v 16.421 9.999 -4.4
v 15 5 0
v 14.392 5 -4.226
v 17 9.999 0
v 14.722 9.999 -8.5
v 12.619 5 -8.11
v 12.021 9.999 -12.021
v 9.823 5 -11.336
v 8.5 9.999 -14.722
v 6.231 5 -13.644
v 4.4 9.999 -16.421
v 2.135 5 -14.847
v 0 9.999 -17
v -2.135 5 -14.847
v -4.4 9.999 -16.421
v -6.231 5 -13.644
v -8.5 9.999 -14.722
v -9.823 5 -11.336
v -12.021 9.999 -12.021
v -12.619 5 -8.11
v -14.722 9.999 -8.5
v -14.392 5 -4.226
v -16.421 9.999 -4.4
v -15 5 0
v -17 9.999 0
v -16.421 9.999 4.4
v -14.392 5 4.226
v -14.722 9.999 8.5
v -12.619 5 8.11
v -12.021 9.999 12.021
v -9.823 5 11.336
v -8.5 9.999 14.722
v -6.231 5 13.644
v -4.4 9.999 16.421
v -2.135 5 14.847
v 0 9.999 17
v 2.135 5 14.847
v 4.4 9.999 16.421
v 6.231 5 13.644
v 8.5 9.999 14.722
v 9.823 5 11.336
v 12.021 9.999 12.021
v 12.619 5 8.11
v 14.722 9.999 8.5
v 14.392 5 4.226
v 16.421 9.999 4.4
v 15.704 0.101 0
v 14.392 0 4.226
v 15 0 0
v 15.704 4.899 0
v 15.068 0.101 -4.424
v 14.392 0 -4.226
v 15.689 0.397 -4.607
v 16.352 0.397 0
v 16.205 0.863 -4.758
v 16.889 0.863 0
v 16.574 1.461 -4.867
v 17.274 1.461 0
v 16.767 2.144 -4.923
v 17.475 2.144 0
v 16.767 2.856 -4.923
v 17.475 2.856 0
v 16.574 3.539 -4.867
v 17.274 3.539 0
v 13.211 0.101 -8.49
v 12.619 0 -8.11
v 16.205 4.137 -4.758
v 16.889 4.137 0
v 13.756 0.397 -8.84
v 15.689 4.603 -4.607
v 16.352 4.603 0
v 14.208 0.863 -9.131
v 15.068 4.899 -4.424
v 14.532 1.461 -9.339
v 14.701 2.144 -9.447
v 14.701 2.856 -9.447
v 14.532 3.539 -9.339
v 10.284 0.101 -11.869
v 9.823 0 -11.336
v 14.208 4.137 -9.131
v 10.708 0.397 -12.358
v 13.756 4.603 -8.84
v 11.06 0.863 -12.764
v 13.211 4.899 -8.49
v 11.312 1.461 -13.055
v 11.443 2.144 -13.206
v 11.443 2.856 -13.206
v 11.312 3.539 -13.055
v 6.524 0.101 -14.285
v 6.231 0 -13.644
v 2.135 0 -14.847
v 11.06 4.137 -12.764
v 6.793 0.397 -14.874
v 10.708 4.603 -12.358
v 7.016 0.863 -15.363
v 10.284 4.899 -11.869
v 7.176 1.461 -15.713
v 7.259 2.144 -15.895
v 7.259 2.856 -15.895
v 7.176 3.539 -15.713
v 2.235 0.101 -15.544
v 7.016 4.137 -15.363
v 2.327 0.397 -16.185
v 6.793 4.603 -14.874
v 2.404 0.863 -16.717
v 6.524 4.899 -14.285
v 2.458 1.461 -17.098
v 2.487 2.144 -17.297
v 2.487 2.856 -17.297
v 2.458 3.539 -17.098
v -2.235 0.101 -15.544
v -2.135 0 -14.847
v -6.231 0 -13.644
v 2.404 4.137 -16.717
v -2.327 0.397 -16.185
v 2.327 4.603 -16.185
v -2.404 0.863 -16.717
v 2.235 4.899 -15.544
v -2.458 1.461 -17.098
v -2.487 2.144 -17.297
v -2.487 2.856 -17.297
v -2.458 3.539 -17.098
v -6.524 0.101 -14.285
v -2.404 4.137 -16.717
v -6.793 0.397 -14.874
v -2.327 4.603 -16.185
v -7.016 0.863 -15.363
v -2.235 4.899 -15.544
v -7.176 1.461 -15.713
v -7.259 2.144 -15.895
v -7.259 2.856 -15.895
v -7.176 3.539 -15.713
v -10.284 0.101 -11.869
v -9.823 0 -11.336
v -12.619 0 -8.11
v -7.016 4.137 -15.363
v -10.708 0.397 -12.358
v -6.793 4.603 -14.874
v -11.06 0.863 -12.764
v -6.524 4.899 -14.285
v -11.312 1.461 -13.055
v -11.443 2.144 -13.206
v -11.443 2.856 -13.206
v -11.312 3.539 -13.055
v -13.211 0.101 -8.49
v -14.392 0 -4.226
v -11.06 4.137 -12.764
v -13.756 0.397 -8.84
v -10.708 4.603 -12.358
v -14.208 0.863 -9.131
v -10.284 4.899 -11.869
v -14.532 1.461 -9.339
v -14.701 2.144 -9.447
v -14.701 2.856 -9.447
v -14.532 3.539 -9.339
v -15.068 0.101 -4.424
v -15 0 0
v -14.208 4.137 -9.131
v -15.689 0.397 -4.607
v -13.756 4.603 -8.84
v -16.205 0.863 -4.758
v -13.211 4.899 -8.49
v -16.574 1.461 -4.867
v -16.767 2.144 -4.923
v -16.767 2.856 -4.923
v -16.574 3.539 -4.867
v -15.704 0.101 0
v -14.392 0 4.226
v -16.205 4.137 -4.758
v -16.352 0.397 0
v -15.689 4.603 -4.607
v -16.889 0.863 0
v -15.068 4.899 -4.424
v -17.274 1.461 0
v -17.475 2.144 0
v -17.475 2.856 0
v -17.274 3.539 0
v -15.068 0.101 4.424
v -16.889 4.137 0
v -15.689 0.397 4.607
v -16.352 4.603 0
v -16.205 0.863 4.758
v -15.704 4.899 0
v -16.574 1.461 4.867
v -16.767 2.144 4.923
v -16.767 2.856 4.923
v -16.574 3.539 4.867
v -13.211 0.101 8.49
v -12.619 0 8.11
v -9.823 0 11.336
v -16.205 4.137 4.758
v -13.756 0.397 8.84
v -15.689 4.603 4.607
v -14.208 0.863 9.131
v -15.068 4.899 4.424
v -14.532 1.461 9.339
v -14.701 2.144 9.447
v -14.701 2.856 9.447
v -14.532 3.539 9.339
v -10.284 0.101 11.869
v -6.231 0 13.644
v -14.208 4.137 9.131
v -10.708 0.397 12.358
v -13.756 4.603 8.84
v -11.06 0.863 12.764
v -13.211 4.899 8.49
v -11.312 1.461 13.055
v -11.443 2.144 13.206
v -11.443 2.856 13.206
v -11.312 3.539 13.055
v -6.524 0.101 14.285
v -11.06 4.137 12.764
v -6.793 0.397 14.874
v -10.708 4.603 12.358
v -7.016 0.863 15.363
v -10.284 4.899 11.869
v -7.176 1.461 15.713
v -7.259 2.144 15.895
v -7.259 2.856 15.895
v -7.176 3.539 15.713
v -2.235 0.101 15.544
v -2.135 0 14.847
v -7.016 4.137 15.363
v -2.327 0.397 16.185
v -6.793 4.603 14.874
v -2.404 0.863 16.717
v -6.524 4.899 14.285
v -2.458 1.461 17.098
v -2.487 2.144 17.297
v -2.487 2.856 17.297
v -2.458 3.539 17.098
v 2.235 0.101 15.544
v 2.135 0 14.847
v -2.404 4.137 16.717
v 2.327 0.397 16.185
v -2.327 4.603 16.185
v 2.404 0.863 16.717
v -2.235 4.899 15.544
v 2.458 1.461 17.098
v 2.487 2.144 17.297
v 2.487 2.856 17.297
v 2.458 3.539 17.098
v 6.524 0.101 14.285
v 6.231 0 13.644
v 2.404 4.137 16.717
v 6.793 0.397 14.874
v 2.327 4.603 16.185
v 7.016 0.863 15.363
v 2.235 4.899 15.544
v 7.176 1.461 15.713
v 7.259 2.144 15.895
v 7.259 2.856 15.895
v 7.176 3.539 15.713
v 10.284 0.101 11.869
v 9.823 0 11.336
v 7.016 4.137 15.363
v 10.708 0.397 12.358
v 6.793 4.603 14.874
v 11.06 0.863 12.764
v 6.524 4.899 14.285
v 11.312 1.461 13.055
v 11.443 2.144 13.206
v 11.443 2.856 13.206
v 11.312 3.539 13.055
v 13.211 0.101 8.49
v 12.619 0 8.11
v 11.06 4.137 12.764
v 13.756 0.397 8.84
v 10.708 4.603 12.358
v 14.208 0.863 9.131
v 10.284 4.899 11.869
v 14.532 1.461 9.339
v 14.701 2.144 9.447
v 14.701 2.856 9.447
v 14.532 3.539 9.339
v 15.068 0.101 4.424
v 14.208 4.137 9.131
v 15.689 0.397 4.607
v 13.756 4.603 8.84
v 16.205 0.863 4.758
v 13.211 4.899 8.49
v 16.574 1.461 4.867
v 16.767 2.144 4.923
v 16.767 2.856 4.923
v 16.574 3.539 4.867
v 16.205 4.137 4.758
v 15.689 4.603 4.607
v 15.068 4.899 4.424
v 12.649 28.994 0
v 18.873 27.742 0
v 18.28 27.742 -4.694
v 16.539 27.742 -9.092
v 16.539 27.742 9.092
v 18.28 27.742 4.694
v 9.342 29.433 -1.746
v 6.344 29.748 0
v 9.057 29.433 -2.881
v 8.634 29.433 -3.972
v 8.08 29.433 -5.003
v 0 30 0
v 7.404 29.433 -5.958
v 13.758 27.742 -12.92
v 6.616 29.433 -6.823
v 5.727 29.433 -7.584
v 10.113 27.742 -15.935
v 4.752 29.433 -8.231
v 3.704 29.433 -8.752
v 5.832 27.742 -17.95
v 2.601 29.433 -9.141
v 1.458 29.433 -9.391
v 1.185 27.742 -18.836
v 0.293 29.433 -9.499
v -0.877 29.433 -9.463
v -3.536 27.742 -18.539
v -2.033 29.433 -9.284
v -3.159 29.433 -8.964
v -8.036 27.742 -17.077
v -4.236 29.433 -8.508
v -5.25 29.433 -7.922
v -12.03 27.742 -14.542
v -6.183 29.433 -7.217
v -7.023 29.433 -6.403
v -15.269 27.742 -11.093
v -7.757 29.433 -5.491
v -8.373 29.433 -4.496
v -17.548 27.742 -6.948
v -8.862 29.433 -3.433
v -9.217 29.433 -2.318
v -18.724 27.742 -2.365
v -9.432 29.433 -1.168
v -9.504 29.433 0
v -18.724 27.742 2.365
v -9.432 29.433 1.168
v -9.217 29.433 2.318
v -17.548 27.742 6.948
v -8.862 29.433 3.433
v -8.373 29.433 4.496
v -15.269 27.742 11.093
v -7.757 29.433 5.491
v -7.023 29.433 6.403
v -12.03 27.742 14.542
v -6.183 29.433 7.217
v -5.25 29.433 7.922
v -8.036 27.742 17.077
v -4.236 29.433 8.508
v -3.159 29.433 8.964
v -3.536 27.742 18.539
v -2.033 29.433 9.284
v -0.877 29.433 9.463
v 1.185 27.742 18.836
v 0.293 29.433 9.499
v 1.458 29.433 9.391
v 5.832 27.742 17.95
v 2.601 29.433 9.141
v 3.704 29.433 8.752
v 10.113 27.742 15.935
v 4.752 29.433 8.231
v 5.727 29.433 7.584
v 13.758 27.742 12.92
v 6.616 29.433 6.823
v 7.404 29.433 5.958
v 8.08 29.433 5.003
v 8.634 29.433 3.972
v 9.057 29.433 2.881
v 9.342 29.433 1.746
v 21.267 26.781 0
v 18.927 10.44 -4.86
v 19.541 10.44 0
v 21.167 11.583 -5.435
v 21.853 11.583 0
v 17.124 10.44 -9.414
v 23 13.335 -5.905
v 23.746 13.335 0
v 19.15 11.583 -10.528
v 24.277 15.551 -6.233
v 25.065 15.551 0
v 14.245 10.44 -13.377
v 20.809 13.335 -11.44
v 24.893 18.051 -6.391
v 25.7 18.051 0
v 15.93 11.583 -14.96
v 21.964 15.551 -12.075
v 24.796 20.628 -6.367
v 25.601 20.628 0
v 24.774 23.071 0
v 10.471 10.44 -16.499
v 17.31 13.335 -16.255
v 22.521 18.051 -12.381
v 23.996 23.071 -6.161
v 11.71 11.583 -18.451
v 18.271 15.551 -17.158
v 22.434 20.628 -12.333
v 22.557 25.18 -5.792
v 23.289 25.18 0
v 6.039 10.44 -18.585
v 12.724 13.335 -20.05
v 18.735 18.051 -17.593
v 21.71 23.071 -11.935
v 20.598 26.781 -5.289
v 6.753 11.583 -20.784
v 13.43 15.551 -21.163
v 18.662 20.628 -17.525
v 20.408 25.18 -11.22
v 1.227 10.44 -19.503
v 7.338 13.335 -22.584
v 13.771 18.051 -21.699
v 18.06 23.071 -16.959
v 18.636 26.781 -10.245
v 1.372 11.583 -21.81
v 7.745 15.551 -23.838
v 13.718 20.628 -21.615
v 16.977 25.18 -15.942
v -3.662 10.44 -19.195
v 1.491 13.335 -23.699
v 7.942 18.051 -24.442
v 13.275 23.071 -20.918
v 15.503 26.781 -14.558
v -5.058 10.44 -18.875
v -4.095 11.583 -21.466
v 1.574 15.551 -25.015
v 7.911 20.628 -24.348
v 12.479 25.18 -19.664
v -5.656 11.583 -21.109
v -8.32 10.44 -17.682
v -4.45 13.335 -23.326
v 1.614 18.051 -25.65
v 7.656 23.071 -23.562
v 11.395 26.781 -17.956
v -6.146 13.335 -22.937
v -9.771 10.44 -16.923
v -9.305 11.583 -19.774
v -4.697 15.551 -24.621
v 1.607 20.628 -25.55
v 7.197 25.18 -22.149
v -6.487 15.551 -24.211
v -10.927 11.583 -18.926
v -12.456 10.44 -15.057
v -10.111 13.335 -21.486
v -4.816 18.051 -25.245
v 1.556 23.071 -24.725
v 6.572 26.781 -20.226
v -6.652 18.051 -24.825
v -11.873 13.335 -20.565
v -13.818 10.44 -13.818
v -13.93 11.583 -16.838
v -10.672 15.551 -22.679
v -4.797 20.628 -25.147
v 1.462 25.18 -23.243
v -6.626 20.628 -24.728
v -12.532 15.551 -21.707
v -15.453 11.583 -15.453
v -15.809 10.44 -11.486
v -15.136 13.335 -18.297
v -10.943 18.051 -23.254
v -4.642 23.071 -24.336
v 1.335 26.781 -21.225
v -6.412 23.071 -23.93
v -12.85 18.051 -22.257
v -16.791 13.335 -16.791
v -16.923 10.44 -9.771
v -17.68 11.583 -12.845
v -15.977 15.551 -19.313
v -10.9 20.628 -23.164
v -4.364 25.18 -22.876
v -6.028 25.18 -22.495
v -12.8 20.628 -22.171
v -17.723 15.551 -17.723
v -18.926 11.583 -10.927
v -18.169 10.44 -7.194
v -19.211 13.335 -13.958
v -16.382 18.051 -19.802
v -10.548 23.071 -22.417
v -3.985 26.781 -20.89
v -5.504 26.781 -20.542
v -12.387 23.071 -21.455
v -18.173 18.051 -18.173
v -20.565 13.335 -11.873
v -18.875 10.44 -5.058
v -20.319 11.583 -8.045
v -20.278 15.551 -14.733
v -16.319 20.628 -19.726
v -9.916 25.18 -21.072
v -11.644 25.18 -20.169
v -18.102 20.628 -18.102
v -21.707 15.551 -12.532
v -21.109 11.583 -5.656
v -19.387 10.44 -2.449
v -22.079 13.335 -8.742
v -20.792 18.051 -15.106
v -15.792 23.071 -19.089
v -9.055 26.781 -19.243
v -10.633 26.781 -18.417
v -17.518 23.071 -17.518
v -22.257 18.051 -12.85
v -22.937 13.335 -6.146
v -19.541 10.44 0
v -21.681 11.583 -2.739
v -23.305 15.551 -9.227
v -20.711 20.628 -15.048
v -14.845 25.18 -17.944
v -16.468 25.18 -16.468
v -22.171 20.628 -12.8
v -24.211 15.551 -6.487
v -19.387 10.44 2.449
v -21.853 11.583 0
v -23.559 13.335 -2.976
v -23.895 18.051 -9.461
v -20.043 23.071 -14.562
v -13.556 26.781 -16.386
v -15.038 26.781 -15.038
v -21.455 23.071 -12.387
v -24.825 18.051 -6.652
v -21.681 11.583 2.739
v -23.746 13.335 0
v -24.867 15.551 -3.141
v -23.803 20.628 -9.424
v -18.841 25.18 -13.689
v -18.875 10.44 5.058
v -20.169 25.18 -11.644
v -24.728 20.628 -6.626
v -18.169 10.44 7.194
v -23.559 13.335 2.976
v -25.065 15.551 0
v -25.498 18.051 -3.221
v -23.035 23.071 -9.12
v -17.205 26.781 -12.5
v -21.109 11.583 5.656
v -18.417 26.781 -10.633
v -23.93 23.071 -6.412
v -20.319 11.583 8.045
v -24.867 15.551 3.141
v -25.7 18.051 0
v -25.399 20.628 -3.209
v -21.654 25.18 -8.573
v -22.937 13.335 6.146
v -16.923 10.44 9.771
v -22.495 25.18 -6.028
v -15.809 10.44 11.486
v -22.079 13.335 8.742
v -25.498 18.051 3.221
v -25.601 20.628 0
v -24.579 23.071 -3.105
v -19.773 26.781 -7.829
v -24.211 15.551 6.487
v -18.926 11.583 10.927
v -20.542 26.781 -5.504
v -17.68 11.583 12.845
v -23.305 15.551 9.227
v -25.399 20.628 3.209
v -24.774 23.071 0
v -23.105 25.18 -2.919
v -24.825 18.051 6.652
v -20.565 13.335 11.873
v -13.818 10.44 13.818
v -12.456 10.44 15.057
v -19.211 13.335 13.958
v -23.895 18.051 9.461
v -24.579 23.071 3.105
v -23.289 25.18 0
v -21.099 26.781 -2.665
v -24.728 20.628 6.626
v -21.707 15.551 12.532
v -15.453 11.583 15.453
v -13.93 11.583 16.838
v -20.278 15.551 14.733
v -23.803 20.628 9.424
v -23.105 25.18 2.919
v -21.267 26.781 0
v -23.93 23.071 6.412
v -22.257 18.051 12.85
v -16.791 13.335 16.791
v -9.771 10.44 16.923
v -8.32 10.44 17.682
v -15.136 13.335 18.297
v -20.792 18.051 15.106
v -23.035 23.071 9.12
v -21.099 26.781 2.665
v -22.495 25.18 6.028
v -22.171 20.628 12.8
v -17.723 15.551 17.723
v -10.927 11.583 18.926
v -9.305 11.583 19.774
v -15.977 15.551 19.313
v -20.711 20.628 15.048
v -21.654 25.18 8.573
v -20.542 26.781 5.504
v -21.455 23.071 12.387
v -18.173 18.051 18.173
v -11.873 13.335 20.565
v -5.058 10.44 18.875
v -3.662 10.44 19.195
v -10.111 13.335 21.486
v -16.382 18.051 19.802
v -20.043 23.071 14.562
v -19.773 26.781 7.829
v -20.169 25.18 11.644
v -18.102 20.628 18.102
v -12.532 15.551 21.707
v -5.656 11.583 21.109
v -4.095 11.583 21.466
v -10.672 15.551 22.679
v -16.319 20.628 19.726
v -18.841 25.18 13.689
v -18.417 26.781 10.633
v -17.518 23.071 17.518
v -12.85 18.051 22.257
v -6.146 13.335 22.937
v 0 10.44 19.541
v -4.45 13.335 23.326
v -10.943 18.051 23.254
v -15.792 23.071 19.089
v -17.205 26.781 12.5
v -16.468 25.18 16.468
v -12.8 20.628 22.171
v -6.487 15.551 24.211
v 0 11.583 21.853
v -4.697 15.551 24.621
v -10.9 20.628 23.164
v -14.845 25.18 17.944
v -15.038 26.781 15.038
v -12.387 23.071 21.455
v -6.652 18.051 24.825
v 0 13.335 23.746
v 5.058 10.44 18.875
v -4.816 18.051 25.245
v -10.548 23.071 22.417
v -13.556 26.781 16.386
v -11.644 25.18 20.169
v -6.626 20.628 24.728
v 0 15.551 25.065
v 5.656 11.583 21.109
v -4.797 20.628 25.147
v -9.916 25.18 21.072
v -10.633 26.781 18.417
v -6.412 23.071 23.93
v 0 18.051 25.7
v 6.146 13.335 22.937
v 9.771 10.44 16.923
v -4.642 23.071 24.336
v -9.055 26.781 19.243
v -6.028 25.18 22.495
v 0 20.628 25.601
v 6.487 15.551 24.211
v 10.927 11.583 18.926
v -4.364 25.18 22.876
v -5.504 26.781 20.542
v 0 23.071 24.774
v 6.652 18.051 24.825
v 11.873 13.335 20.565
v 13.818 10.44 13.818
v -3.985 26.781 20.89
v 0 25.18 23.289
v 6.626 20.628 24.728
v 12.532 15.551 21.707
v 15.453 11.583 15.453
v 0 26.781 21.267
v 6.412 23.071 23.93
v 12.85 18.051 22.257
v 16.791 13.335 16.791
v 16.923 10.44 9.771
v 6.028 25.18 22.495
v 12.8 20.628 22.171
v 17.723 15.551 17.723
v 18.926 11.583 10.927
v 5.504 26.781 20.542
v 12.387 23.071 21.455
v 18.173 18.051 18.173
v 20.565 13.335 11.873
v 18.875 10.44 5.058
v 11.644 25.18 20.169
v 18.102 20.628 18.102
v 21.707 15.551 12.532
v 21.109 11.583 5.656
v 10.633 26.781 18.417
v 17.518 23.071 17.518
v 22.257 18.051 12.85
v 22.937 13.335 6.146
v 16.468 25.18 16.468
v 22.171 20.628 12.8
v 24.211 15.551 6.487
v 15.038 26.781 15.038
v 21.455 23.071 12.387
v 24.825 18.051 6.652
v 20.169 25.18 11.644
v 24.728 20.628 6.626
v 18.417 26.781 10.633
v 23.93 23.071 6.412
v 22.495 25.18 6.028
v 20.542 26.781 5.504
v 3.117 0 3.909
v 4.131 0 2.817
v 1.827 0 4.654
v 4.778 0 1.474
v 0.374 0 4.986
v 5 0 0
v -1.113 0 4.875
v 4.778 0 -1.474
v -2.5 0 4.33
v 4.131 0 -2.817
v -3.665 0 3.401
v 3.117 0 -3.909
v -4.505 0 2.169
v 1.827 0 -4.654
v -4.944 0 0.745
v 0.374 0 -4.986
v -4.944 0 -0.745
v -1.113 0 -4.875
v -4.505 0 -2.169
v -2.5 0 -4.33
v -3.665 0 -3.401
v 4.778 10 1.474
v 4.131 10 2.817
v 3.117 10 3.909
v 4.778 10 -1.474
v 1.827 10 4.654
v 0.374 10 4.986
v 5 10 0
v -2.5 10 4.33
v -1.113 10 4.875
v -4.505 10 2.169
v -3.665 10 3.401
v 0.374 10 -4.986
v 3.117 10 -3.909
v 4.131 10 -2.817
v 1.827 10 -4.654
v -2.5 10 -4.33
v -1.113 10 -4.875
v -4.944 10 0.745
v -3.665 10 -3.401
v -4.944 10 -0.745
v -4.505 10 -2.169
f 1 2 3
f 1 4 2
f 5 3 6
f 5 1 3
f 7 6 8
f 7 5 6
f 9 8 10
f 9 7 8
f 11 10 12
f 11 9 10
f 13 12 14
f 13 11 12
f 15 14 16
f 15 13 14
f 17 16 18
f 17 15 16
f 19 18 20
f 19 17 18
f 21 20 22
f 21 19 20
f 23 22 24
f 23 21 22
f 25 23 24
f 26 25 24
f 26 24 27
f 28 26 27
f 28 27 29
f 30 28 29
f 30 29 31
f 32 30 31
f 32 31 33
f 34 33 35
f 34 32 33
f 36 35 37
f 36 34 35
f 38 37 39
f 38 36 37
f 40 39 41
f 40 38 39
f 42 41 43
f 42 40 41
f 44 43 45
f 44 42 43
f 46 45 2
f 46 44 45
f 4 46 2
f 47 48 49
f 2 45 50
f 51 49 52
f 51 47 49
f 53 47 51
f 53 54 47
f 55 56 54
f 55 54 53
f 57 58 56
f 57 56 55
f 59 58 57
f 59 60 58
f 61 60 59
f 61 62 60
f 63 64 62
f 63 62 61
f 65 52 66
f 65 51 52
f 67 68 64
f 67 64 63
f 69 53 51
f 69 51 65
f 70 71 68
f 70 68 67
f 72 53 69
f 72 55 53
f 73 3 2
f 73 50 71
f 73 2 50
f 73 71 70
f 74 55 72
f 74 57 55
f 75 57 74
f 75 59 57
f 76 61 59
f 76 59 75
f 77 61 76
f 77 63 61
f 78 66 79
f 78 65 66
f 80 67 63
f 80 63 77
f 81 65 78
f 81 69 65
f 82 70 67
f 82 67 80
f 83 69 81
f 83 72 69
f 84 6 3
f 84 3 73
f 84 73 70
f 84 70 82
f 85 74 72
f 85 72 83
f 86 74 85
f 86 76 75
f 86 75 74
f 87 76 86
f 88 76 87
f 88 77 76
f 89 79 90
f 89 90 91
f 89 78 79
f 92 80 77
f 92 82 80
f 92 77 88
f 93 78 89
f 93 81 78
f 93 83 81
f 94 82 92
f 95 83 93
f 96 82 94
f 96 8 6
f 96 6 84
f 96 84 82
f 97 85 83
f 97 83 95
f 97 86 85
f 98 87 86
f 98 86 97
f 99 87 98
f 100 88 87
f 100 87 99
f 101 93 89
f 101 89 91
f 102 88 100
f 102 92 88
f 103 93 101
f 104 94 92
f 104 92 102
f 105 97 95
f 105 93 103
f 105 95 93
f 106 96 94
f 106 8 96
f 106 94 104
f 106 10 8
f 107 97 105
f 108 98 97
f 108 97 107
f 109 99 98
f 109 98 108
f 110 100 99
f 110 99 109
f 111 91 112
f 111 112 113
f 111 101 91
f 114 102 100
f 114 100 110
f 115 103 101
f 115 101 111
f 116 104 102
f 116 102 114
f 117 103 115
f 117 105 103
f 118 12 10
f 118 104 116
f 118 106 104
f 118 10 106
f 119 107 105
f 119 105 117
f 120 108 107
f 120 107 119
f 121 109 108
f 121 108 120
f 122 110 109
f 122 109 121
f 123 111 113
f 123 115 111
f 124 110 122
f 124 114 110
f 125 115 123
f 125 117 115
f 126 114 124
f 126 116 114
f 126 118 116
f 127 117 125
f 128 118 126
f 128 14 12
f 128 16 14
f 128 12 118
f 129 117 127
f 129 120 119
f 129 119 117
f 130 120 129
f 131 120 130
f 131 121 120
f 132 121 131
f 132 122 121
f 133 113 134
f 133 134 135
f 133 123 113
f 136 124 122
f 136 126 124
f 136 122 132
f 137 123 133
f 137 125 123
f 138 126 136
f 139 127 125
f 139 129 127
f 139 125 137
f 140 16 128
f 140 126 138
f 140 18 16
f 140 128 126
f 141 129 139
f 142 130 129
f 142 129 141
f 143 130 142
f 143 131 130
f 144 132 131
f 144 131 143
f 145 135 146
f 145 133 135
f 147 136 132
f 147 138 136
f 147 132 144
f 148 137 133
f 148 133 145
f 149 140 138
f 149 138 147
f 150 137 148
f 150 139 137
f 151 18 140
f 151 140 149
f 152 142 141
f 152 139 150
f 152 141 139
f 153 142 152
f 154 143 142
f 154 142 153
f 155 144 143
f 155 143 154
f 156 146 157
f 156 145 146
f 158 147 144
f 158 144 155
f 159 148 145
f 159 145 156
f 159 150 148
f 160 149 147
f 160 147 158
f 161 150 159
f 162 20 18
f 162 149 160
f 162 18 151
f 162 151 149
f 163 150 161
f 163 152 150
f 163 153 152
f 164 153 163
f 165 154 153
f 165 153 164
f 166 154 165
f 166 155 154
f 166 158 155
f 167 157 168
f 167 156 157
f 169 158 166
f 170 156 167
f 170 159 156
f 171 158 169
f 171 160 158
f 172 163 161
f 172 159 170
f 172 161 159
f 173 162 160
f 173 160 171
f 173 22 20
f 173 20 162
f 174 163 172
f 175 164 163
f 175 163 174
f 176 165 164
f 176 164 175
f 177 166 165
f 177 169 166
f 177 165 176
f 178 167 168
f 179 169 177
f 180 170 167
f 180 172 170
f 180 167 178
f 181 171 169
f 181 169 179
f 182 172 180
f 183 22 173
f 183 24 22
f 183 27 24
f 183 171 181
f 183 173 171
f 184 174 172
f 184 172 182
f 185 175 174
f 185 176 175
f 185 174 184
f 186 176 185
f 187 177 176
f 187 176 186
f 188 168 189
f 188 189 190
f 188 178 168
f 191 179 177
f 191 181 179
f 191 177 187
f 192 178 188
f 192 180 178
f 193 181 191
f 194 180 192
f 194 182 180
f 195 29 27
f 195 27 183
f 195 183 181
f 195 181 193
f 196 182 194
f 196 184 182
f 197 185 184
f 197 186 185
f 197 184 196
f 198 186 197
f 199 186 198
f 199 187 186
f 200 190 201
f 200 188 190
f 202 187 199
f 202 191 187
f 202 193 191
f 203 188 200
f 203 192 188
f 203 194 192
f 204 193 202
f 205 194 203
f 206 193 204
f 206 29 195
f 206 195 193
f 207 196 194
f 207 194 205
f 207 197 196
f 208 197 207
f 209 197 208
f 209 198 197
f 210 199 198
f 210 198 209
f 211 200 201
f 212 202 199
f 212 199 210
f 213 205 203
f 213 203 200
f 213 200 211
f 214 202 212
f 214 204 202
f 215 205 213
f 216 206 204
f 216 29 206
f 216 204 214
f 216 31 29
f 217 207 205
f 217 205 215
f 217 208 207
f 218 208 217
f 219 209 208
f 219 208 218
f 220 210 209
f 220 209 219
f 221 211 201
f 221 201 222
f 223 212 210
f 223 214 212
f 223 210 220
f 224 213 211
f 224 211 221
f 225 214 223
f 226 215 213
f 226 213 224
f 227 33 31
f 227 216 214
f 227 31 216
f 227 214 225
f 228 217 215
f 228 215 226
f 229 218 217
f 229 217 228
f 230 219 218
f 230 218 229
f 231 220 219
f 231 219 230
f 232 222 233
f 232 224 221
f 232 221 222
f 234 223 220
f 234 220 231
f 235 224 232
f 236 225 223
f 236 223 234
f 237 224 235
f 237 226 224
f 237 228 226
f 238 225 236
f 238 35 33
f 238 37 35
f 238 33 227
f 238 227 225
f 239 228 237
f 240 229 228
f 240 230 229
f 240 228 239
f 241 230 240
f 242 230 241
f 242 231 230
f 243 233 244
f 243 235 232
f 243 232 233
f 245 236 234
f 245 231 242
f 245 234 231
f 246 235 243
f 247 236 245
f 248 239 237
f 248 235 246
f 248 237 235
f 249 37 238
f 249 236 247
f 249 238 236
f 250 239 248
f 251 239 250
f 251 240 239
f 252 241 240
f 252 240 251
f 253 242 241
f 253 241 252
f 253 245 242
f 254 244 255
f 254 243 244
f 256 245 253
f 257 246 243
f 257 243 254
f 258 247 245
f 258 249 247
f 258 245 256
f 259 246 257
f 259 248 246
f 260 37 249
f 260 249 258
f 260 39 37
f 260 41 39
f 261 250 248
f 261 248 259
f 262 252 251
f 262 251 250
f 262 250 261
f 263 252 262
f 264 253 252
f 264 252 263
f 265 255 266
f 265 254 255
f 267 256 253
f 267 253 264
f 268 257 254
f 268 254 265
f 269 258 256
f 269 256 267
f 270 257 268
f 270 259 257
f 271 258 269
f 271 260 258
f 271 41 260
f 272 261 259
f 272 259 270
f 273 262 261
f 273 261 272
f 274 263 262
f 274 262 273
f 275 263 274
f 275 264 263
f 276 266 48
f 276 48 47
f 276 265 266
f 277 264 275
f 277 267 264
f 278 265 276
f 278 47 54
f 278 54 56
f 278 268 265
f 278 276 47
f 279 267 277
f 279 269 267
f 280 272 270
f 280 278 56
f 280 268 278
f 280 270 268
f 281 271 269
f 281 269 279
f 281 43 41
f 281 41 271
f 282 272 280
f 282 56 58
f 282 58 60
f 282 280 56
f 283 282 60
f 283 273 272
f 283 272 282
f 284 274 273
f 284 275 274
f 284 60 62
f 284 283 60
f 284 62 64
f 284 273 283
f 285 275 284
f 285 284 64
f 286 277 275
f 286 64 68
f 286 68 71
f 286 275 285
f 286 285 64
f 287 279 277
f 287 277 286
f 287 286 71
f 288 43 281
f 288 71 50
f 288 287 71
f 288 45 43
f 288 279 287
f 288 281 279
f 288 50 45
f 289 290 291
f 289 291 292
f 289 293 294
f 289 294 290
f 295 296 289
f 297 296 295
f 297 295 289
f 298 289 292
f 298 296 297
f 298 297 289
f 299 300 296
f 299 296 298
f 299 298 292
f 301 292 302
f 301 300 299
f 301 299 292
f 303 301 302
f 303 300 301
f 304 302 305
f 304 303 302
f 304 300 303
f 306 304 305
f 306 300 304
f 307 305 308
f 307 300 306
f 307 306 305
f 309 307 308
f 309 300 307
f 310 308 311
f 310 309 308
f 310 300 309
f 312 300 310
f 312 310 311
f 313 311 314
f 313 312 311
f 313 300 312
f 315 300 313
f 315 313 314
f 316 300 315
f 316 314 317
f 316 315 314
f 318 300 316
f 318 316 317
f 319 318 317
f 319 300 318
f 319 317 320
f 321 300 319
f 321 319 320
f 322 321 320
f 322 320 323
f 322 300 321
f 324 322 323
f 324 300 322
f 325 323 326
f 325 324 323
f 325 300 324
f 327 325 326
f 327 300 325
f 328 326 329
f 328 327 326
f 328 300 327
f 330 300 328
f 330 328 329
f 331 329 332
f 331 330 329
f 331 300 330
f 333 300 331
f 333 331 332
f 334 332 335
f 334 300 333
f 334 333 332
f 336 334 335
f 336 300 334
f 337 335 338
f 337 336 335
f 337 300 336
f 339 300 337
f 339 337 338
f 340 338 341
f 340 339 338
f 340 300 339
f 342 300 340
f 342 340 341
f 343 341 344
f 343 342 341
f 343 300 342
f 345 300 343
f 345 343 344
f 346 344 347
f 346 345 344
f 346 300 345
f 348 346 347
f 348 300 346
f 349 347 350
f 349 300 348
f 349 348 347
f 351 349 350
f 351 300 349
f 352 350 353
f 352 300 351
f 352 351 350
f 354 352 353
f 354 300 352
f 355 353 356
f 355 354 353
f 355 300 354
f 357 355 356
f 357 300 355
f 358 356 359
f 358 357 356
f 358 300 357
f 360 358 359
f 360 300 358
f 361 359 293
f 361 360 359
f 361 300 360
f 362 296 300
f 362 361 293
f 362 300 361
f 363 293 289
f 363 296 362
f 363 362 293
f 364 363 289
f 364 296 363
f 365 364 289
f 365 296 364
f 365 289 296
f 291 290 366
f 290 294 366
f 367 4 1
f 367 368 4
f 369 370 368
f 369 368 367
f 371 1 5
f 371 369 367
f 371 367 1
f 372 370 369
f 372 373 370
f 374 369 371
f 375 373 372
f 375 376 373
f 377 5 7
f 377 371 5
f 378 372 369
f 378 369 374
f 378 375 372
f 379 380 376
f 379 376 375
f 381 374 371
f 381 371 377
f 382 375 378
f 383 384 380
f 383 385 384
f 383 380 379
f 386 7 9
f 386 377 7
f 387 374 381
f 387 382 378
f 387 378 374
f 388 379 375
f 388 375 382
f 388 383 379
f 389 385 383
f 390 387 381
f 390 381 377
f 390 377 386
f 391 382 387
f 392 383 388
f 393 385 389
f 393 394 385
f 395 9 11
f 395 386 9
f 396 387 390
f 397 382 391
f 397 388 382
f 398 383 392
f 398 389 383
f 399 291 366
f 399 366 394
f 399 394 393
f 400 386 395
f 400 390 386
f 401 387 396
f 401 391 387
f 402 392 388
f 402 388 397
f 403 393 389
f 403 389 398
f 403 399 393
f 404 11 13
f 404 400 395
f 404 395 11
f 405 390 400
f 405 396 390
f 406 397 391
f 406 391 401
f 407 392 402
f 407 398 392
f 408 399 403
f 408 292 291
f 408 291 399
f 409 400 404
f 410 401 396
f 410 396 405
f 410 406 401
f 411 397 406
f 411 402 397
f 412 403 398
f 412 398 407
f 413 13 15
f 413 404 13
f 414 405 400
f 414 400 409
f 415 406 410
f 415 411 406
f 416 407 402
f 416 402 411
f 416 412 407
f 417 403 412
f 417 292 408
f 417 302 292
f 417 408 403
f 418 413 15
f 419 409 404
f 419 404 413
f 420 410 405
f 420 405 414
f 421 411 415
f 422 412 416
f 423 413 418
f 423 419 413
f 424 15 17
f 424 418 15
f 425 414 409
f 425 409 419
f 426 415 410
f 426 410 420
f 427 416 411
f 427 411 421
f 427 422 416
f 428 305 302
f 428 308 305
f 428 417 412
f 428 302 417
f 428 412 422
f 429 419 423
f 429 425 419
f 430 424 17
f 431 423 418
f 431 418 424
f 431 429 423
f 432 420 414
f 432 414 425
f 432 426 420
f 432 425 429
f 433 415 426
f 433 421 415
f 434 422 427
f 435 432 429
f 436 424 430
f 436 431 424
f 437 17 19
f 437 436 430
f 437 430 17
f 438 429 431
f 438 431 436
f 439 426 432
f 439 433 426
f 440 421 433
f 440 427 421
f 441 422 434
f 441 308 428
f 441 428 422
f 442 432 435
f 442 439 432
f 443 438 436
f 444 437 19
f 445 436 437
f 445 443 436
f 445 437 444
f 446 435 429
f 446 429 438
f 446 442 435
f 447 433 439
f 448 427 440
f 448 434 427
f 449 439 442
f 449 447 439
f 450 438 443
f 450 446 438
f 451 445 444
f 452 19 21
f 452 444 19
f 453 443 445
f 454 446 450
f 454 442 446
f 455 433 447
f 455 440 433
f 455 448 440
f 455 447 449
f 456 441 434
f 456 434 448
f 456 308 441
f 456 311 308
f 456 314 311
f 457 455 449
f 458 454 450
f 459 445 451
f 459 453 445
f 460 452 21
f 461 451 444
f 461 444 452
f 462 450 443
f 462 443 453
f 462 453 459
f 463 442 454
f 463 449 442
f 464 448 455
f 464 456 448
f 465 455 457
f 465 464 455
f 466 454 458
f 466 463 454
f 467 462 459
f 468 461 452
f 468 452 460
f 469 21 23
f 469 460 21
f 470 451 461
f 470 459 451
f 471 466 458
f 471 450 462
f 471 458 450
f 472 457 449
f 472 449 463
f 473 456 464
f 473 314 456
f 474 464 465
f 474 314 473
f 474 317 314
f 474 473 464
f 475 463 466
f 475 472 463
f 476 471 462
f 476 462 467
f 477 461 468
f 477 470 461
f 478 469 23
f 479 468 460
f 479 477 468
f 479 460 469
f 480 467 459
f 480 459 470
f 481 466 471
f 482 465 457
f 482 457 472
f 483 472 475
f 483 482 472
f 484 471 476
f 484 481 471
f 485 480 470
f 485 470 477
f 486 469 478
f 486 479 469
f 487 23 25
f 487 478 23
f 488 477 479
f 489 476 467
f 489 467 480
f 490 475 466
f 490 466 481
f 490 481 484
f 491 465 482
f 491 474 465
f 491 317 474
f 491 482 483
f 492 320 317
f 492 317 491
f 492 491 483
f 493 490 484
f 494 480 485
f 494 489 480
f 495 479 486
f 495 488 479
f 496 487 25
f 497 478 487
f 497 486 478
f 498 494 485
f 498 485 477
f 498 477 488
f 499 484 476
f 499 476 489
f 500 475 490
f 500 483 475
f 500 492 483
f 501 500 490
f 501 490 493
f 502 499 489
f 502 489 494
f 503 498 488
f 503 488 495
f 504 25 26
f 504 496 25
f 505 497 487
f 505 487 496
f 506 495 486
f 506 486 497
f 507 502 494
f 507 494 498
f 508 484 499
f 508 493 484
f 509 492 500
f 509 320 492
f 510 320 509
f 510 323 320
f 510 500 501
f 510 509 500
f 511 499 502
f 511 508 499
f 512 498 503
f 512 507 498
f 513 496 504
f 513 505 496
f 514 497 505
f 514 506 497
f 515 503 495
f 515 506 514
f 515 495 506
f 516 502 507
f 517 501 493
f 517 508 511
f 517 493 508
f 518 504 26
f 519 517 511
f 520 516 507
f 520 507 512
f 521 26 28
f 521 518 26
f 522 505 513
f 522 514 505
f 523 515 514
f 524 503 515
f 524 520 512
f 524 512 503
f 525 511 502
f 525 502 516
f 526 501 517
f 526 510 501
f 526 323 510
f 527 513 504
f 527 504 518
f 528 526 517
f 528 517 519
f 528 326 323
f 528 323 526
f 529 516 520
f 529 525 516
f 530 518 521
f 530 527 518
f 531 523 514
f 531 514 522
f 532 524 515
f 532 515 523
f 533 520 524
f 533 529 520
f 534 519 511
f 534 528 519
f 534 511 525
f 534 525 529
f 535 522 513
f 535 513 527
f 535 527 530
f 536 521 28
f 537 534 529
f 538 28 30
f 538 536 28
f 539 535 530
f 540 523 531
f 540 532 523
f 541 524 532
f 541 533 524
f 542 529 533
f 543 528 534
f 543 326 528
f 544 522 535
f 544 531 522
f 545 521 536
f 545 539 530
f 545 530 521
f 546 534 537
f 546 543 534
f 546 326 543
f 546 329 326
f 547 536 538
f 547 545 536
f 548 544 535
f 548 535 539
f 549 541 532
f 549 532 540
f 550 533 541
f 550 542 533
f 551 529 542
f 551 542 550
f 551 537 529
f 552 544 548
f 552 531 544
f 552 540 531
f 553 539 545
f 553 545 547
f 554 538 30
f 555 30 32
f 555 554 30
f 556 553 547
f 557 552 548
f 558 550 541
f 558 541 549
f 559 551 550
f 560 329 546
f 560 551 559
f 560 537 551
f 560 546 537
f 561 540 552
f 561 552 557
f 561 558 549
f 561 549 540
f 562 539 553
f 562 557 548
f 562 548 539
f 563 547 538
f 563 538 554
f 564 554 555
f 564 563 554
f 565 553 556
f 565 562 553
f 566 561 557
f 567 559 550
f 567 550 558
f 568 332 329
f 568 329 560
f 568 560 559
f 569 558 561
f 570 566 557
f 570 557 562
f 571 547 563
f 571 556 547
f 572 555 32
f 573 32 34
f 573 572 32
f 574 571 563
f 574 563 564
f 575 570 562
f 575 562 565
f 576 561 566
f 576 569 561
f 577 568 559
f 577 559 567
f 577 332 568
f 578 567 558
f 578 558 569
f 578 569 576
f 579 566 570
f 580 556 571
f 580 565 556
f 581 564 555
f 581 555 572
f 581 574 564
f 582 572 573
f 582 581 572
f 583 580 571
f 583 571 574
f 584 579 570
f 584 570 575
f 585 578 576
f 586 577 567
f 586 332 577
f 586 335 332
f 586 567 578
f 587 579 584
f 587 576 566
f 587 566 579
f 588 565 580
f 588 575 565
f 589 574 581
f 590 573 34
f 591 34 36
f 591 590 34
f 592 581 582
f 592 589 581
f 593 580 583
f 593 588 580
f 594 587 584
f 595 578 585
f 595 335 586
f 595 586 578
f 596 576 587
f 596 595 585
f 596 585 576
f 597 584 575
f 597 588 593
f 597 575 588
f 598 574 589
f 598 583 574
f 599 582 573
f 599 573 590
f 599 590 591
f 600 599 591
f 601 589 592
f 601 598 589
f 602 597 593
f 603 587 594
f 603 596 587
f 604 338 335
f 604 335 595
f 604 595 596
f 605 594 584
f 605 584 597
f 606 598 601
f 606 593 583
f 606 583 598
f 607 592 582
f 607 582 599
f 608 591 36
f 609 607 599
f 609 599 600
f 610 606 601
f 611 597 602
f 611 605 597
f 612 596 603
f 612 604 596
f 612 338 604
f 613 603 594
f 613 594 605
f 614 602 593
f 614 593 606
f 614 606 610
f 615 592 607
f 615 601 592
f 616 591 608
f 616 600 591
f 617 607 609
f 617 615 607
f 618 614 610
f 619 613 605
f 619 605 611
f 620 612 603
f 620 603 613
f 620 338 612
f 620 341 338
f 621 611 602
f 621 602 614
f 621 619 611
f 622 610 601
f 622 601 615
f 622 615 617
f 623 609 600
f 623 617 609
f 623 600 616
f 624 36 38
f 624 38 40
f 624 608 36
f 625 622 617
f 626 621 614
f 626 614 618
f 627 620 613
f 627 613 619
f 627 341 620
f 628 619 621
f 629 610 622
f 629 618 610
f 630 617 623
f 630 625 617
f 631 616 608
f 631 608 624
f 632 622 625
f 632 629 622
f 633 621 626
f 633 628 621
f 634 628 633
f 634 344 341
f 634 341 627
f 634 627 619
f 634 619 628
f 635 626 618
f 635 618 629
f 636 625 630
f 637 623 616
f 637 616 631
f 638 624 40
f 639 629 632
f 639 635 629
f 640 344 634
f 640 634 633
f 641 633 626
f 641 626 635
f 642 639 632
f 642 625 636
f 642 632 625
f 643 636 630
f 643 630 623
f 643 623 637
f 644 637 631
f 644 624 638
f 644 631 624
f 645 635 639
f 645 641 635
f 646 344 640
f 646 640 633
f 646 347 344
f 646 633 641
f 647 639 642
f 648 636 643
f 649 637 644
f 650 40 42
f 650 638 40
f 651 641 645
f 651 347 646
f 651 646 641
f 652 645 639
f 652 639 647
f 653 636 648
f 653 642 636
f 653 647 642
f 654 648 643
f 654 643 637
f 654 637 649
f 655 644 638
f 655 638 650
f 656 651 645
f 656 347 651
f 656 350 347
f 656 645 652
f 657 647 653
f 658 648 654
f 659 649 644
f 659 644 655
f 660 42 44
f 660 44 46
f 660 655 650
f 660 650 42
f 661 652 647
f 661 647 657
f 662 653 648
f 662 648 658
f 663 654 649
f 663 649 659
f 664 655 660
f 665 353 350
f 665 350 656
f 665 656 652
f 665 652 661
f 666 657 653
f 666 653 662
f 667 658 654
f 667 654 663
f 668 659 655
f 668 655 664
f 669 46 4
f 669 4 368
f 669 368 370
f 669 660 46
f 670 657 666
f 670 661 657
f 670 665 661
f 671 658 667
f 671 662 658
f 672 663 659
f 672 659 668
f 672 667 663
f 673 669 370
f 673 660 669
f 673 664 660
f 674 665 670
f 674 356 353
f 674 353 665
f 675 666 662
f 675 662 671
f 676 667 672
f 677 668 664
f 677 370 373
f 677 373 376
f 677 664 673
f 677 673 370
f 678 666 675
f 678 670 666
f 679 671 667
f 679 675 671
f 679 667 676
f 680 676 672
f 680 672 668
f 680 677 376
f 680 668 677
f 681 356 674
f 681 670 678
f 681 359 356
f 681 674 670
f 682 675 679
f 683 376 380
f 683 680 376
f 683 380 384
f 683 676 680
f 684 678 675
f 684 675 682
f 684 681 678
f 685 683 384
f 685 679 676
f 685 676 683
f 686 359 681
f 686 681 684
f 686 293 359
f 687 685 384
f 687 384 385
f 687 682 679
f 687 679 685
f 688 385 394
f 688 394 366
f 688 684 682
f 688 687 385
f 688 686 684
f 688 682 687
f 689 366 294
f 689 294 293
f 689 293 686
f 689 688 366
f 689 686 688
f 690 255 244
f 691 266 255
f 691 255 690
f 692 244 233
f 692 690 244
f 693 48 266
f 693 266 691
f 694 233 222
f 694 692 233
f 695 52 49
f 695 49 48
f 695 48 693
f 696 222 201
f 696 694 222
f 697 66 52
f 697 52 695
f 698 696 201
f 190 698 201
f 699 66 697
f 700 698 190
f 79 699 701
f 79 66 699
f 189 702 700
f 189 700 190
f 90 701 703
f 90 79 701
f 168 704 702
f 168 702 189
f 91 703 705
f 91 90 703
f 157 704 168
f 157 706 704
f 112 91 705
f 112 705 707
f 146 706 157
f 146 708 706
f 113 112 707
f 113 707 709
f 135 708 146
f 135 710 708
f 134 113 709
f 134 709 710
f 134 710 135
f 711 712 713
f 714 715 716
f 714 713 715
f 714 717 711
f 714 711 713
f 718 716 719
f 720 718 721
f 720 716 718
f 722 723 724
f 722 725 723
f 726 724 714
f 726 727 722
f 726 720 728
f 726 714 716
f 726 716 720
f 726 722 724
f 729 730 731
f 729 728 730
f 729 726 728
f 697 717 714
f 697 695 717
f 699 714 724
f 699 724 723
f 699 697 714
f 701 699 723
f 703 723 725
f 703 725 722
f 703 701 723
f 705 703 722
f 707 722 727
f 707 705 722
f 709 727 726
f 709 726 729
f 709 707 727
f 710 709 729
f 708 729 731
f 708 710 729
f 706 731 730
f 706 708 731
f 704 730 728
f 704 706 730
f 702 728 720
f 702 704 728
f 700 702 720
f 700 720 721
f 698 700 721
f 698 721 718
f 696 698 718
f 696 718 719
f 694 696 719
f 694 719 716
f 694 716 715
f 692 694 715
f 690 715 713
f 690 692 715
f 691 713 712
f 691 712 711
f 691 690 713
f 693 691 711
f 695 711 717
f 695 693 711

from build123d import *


with BuildPart() as part:
    # Croquis1 → Revolución1 (revolve)
    with BuildSketch(Plane.XY):
        with BuildLine():
            Line((5, 0), (15, 0))
            ThreePointArc((15, 0), (17.5, 2.5), (15, 5))
            Line((15, 5), (17, 9.999396685))
            ThreePointArc((17, 9.999396685), (25.700254064, 18.050962315), (18.873239437, 27.741885964))
            ThreePointArc((18.873239437, 27.741885964), (9.503923477, 29.433465482), (0, 30))
            Line((0, 30), (0, 10))
            Line((0, 10), (5, 10))
            Line((5, 10), (5, 0))
        make_face()
    revolve(axis=Axis((0, -10.165252064, 0), (0, 1, 0)))


solid = part.part
